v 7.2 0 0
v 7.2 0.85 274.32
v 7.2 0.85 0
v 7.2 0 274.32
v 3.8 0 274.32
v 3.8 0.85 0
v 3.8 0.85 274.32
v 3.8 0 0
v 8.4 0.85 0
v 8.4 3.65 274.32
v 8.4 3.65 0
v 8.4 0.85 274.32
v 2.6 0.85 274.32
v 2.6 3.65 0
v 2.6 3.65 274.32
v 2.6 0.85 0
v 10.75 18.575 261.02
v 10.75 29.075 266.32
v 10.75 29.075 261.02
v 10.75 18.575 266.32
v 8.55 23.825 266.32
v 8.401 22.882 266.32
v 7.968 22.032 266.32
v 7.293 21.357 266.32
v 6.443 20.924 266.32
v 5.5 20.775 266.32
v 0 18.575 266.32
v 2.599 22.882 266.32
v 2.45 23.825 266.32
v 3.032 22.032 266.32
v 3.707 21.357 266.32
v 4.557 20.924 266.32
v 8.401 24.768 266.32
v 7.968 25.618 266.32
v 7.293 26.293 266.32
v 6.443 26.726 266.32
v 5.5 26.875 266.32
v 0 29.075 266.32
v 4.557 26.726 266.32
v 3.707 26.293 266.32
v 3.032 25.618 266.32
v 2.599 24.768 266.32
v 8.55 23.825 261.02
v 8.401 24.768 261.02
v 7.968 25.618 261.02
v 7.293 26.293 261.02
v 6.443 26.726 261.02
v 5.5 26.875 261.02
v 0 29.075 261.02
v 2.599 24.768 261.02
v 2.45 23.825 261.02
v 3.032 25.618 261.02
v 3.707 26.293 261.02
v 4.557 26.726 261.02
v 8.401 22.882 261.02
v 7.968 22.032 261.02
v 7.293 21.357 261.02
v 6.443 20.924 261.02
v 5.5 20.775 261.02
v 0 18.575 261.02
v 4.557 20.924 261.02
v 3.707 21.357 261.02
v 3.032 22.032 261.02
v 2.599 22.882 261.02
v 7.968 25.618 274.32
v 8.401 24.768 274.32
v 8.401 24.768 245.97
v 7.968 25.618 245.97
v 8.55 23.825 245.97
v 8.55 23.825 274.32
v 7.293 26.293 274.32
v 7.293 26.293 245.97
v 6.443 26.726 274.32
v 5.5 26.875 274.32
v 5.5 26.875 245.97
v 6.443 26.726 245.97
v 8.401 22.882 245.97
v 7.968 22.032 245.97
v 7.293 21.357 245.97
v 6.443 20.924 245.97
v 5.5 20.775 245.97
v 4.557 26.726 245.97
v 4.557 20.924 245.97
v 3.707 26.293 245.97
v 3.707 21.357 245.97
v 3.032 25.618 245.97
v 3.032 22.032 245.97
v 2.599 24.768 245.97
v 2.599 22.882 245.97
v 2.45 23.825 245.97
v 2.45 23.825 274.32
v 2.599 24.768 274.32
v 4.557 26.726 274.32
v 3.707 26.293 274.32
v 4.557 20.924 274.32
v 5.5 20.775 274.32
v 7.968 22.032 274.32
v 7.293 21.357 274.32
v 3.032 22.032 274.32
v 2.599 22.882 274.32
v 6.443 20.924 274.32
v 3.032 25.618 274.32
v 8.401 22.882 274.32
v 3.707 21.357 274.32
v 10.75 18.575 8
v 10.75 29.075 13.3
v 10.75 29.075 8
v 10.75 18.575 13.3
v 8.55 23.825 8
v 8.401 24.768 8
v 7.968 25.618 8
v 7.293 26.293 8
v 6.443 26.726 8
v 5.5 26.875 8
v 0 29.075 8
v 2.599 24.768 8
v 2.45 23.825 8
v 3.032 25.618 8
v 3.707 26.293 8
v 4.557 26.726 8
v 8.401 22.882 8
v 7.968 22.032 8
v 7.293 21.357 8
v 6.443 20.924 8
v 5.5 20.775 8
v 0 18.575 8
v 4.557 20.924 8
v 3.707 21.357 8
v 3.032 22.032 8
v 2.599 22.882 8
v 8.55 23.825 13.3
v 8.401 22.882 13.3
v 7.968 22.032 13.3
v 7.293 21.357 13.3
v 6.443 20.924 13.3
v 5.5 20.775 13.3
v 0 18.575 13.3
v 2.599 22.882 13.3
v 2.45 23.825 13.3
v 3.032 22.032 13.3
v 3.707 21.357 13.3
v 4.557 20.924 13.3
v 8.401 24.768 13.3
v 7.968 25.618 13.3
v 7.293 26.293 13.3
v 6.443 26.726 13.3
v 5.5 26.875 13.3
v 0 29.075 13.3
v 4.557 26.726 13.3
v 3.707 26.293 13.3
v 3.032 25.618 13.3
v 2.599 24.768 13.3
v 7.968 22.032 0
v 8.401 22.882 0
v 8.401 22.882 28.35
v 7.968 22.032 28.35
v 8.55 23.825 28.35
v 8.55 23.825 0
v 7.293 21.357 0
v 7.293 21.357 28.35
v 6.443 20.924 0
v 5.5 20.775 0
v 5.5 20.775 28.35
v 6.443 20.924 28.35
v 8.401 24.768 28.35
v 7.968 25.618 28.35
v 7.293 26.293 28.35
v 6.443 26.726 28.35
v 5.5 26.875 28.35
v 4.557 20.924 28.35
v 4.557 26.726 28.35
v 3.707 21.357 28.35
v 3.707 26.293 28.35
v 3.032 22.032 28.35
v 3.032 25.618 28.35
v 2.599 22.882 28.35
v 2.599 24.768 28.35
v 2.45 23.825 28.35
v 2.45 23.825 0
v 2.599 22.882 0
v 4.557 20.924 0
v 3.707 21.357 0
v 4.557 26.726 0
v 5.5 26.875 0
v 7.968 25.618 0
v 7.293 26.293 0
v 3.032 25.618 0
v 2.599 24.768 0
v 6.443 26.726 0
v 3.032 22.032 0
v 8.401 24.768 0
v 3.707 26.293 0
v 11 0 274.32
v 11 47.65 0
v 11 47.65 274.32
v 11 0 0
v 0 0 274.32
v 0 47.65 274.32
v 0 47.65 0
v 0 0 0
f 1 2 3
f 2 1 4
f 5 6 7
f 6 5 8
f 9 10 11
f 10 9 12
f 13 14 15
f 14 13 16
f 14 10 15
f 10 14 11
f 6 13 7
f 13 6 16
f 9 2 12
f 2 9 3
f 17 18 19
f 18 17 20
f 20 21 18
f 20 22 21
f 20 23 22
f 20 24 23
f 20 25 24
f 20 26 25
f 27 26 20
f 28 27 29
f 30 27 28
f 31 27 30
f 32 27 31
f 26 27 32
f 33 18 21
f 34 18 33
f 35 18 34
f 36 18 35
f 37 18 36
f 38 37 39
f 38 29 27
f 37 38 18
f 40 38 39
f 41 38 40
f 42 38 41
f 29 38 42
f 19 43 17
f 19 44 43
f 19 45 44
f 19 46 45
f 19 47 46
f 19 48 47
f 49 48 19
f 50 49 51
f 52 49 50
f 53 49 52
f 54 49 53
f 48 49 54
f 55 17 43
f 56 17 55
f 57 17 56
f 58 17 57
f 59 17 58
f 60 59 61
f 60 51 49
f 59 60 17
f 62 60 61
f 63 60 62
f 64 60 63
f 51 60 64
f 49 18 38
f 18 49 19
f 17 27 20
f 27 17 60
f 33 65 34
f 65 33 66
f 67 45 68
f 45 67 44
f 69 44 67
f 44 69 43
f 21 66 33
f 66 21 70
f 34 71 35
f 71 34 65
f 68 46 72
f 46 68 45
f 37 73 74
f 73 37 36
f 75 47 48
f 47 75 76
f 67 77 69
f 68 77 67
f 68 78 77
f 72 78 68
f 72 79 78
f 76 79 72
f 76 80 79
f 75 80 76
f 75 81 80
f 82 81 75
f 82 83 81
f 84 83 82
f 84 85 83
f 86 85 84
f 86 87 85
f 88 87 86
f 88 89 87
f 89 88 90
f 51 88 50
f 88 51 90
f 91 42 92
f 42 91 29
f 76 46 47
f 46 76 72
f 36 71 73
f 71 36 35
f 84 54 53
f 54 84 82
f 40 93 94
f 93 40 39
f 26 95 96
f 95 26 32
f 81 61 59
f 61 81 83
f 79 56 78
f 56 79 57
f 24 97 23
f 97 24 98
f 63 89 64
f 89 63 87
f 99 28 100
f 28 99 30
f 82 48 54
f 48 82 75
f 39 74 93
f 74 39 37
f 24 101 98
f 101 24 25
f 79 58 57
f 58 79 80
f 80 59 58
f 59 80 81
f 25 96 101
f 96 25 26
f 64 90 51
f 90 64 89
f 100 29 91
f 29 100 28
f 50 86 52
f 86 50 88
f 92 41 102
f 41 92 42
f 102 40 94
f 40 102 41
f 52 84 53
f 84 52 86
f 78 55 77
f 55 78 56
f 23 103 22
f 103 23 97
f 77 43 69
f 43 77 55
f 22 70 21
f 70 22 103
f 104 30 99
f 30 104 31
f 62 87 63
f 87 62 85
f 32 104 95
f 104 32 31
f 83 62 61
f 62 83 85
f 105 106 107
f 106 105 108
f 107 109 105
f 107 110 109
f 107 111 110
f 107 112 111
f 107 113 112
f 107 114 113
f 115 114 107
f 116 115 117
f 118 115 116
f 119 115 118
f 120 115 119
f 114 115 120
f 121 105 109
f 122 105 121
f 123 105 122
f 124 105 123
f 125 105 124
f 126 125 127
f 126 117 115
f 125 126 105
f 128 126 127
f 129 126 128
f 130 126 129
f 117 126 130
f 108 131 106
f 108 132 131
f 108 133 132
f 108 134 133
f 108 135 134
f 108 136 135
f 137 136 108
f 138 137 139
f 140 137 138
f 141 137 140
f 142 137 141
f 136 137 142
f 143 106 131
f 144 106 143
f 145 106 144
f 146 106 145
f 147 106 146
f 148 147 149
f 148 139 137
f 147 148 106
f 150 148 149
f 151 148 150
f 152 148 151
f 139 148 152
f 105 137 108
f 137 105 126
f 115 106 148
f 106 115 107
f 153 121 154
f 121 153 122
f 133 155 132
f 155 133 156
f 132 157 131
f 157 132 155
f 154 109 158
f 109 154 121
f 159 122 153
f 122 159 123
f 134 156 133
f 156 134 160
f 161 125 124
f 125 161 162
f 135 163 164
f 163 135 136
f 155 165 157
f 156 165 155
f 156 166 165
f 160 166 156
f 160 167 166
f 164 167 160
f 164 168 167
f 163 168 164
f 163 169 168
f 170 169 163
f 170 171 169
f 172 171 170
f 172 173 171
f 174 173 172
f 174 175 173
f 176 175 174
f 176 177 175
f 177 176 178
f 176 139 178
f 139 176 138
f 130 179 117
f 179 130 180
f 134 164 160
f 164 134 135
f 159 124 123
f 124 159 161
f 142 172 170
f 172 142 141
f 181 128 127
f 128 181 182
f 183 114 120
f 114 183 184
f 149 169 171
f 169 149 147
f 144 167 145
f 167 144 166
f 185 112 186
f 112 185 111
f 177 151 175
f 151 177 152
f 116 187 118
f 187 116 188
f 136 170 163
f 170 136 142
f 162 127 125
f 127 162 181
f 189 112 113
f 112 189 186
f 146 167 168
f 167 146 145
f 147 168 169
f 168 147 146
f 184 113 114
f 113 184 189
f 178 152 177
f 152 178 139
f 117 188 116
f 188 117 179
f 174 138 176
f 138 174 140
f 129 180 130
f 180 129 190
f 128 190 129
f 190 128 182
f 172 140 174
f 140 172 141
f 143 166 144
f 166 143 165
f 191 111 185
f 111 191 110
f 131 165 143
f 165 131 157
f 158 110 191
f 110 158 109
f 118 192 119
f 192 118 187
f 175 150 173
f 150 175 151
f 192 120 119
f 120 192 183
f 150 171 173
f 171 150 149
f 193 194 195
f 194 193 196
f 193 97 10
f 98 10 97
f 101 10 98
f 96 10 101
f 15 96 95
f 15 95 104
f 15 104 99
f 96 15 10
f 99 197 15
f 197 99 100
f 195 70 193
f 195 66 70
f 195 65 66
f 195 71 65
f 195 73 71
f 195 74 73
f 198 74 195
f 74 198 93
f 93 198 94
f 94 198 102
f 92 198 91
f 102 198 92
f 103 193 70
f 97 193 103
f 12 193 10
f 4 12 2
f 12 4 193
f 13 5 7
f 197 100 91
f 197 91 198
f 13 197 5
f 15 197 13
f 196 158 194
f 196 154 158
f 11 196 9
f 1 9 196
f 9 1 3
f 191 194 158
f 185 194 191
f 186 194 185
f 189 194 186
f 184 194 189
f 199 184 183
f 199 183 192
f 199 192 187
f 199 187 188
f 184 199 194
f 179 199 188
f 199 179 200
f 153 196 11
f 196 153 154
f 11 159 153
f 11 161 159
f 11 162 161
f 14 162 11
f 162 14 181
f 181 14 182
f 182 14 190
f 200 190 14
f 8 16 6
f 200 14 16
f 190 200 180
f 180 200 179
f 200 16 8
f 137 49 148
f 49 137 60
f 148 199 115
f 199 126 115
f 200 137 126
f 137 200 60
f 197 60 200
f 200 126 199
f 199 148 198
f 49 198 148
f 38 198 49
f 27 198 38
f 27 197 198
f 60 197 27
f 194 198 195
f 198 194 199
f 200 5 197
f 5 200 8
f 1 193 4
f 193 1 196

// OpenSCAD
railHp = 54;//the length of a rail in hp
hp = 5.08;//represents of the width in mm of each unit of hp; defaults to Eurorack standard (5.08)

slidingNutHeight = 5.4; //the height of the nut; defaults to the height of a common m3 square nut (5.4)

slidingNutThickness = 2.4; //The thickness/depth of the nut, back to front; defaults to the size of a common m3 square nut (2.4)

slidingNutMargin = .2;//margin added to the thickness of the nut for fit tolerance

railGapHeight = 3.4;//The gap in the rail through which the nuts are visible

railFrontThickness = 2.25; //The thickness of the part of the rail between the front of the rail and the nuts

railBackThickness = 45;//The thickness of the rail "behind" the nuts; thicker is presumably sturdier and less prone to bending; should be thick enough to accommodate more than 2x bracketNutHeight
railHeight = 11;//The overall height of the rail, "top" to "bottom"; should be considerably greater than the bracket nut height

railMargin = 0;//A little extra length to each side of the rail, as needed

bracketNutHeight = 9.8; //The height of the nut securing the rail to the bracket; defaults to common m6 square nut (9.8)
bracketNutThickness = 4.6;//The thickness of the bracket nut; defaults to a common m6 square nut (4.6)
bracketNutInset = 8; //How "deep" into the rail is the nut inset; longer screws will require a greater value
bracketNutMargin =.35;//A margin around the bracket nut for fit tolerance; This nut ought to fit fairly snugly
bracketScrewHoleDiameter = 6.1; //The diameter of the bracket screw; defaults to typical m6 diameter (6.1)

railDepth = railFrontThickness+slidingNutMargin*2+railBackThickness;
railLength = railHp*hp+railMargin*2;

echo("rail depth: ", railDepth);
echo("rail length: ", railLength);

rail();

module rail()
{
    difference()
    {
        railBase();
        translate([railHeight/2,-1,railLength/2-.5]){
            railDiff();
        }   
        
        translate([railHeight/2,railDepth/2,railLength - (bracketNutInset+((bracketNutThickness+bracketNutMargin*2)/2))]){
     bracketNutDiff();
        }
        

translate([railHeight/2,railDepth/2,(bracketNutInset+((bracketNutThickness+bracketNutMargin*2)/2))]){
    rotate([180,0,0]){
     bracketNutDiff();
    }
        }
    }
}

module railBase()
{
    cube([railHeight,railDepth,railLength]);
}

module bracketNutDiff()
{
    bracketNutNotchDepth = (bracketNutHeight+bracketNutMargin*2) - (railHeight -(bracketNutHeight+bracketNutMargin*2));
    
    bracketScrewRad = bracketScrewHoleDiameter/2;
    
    union(){
    cube([bracketNutHeight+bracketNutMargin*2, bracketNutHeight+bracketNutMargin*2, bracketNutThickness+bracketNutMargin*2], center = true);
        translate([0,0,bracketNutThickness/2-20]){
            cylinder(r=bracketScrewRad, h=bracketNutInset+21, $fn=20);
            }
            translate([-((bracketNutHeight+bracketNutMargin*2)+bracketNutNotchDepth)/2-.5,0,0]){
                cube([bracketNutNotchDepth+1,bracketNutHeight+bracketNutMargin*2, bracketNutThickness+bracketNutMargin*2], center=true);
                }
    }
}

module railDiff()
{
    union()
    {
        cube([railGapHeight,railFrontThickness+2,railLength+2], center=true);
        translate([0,railFrontThickness+1,0]){
        cube([slidingNutHeight+slidingNutMargin*2,slidingNutThickness+slidingNutMargin*2,railLength+2],center=true);
        }
    }
}
